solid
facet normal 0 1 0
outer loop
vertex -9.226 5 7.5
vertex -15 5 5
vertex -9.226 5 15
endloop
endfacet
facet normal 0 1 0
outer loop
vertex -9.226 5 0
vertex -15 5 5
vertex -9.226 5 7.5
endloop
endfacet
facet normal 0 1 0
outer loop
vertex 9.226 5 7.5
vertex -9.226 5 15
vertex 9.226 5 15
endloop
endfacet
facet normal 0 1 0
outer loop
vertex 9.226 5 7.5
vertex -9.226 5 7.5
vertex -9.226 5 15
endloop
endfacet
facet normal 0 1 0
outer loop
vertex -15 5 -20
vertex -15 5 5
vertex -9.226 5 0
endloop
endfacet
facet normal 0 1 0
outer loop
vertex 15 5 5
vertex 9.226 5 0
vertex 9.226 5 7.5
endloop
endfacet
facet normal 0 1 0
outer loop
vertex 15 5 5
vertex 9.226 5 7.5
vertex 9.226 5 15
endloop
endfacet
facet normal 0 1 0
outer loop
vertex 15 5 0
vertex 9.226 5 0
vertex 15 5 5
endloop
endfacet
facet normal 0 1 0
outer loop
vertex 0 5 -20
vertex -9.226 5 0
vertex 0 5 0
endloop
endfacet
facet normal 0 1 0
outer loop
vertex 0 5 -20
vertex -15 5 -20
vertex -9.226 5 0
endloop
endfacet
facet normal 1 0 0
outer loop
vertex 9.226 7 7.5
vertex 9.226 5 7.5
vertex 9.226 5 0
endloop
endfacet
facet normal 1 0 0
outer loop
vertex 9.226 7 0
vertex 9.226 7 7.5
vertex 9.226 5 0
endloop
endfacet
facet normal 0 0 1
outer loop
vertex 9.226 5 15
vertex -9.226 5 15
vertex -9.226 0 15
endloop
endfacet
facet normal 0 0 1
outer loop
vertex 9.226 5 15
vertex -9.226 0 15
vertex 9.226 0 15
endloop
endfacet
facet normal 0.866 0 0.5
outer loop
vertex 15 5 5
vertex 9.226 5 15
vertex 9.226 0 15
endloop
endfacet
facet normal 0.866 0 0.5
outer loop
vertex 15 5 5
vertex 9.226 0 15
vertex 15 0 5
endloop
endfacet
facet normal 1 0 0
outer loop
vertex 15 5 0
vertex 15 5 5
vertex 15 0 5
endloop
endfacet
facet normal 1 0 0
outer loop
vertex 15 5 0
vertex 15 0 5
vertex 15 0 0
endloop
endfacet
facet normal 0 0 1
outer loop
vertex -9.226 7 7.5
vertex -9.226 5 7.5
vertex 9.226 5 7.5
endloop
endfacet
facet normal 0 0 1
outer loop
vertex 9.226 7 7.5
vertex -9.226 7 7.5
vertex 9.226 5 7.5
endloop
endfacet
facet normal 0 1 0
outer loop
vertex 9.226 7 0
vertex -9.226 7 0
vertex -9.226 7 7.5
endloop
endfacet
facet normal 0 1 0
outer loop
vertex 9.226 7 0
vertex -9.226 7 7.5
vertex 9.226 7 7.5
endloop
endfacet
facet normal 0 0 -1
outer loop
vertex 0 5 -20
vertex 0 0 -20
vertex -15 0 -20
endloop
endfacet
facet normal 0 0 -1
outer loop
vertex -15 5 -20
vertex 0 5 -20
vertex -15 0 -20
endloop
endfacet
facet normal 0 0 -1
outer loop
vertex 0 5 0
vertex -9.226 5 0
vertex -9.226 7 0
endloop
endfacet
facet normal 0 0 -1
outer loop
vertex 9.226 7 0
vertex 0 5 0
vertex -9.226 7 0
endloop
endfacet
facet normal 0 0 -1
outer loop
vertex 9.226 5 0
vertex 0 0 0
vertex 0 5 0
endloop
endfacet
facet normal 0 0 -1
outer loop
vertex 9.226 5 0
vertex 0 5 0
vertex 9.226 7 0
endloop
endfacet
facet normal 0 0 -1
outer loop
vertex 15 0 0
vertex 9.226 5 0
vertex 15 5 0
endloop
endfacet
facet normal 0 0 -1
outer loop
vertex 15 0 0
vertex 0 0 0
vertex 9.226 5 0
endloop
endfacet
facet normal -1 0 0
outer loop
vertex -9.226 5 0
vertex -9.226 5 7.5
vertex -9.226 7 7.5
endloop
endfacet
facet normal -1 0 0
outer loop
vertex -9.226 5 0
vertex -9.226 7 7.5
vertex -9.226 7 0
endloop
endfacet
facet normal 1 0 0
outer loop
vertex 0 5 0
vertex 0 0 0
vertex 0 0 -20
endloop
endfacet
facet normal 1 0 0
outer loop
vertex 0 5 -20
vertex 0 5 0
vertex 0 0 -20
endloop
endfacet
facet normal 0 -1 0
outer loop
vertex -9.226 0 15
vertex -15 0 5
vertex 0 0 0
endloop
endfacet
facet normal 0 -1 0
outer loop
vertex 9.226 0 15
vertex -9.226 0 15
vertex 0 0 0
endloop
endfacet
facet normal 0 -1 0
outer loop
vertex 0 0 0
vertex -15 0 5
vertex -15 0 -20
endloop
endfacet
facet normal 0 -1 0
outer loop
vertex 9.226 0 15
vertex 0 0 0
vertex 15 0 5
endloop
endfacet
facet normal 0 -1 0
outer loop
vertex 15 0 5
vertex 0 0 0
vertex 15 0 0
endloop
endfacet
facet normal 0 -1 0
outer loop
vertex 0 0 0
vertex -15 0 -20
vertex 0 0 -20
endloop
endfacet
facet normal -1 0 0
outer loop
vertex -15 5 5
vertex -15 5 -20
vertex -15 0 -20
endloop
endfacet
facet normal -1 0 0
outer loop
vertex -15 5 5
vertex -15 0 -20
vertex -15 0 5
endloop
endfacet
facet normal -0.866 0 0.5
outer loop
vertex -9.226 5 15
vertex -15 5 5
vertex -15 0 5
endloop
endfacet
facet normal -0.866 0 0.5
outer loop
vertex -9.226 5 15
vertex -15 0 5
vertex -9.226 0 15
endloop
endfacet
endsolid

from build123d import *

# Parameters (mm, degrees)
BOSS_EXTRUDE1_DEPTH = 5
CUT_EXTRUDE1_REACH  = 7
SKETCH3_W           = 18.452994616
SKETCH3_H           = 7.5
BOSS_EXTRUDE2_DEPTH = 2


with BuildPart() as part:
    # Sketch1 → Boss-Extrude1 (new body)
    with BuildSketch(Plane(origin=(0, 0, 0), x_dir=(1, 0, 0), z_dir=(0, 1, 0))):
        Polygon((0, 0), (0, 20), (-25, 20), (-25, -20), (-8.000491869, -49.444011787), (8.000491869, -49.444011787), (25, -20), (25, 0), align=None)
    extrude(amount=BOSS_EXTRUDE1_DEPTH)

    # Sketch2 → Cut-Extrude1 (cut, up to next)
    with BuildSketch(Plane(origin=(0, 5, 0), x_dir=(1, 0, 0), z_dir=(0, 1, 0)), mode=Mode.PRIVATE) as cut_extrude1_sk1:
        Polygon((-15, 20), (-15, -5), (-9.226497308, -15), (9.226497308, -15), (15, -5), (15, 0), (25, 0), (25, -20), (8.000491869, -49.444011787), (-8.000491869, -49.444011787), (-25, -20), (-25, 20), align=None)
    cut_extrude1_tool1 = extrude(cut_extrude1_sk1.sketch, amount=-CUT_EXTRUDE1_REACH, mode=Mode.PRIVATE) & part.part
    add(cut_extrude1_tool1.solids().sort_by_distance((-2.247946, 5, 20.557757))[0], mode=Mode.SUBTRACT)

    # Sketch3 → Boss-Extrude2 (add)
    with BuildSketch(Plane(origin=(0, 5, 0), x_dir=(1, 0, 0), z_dir=(0, 1, 0))):
        with Locations((0, -3.75)):
            Rectangle(SKETCH3_W, SKETCH3_H)
    extrude(amount=BOSS_EXTRUDE2_DEPTH)


solid = part.part
